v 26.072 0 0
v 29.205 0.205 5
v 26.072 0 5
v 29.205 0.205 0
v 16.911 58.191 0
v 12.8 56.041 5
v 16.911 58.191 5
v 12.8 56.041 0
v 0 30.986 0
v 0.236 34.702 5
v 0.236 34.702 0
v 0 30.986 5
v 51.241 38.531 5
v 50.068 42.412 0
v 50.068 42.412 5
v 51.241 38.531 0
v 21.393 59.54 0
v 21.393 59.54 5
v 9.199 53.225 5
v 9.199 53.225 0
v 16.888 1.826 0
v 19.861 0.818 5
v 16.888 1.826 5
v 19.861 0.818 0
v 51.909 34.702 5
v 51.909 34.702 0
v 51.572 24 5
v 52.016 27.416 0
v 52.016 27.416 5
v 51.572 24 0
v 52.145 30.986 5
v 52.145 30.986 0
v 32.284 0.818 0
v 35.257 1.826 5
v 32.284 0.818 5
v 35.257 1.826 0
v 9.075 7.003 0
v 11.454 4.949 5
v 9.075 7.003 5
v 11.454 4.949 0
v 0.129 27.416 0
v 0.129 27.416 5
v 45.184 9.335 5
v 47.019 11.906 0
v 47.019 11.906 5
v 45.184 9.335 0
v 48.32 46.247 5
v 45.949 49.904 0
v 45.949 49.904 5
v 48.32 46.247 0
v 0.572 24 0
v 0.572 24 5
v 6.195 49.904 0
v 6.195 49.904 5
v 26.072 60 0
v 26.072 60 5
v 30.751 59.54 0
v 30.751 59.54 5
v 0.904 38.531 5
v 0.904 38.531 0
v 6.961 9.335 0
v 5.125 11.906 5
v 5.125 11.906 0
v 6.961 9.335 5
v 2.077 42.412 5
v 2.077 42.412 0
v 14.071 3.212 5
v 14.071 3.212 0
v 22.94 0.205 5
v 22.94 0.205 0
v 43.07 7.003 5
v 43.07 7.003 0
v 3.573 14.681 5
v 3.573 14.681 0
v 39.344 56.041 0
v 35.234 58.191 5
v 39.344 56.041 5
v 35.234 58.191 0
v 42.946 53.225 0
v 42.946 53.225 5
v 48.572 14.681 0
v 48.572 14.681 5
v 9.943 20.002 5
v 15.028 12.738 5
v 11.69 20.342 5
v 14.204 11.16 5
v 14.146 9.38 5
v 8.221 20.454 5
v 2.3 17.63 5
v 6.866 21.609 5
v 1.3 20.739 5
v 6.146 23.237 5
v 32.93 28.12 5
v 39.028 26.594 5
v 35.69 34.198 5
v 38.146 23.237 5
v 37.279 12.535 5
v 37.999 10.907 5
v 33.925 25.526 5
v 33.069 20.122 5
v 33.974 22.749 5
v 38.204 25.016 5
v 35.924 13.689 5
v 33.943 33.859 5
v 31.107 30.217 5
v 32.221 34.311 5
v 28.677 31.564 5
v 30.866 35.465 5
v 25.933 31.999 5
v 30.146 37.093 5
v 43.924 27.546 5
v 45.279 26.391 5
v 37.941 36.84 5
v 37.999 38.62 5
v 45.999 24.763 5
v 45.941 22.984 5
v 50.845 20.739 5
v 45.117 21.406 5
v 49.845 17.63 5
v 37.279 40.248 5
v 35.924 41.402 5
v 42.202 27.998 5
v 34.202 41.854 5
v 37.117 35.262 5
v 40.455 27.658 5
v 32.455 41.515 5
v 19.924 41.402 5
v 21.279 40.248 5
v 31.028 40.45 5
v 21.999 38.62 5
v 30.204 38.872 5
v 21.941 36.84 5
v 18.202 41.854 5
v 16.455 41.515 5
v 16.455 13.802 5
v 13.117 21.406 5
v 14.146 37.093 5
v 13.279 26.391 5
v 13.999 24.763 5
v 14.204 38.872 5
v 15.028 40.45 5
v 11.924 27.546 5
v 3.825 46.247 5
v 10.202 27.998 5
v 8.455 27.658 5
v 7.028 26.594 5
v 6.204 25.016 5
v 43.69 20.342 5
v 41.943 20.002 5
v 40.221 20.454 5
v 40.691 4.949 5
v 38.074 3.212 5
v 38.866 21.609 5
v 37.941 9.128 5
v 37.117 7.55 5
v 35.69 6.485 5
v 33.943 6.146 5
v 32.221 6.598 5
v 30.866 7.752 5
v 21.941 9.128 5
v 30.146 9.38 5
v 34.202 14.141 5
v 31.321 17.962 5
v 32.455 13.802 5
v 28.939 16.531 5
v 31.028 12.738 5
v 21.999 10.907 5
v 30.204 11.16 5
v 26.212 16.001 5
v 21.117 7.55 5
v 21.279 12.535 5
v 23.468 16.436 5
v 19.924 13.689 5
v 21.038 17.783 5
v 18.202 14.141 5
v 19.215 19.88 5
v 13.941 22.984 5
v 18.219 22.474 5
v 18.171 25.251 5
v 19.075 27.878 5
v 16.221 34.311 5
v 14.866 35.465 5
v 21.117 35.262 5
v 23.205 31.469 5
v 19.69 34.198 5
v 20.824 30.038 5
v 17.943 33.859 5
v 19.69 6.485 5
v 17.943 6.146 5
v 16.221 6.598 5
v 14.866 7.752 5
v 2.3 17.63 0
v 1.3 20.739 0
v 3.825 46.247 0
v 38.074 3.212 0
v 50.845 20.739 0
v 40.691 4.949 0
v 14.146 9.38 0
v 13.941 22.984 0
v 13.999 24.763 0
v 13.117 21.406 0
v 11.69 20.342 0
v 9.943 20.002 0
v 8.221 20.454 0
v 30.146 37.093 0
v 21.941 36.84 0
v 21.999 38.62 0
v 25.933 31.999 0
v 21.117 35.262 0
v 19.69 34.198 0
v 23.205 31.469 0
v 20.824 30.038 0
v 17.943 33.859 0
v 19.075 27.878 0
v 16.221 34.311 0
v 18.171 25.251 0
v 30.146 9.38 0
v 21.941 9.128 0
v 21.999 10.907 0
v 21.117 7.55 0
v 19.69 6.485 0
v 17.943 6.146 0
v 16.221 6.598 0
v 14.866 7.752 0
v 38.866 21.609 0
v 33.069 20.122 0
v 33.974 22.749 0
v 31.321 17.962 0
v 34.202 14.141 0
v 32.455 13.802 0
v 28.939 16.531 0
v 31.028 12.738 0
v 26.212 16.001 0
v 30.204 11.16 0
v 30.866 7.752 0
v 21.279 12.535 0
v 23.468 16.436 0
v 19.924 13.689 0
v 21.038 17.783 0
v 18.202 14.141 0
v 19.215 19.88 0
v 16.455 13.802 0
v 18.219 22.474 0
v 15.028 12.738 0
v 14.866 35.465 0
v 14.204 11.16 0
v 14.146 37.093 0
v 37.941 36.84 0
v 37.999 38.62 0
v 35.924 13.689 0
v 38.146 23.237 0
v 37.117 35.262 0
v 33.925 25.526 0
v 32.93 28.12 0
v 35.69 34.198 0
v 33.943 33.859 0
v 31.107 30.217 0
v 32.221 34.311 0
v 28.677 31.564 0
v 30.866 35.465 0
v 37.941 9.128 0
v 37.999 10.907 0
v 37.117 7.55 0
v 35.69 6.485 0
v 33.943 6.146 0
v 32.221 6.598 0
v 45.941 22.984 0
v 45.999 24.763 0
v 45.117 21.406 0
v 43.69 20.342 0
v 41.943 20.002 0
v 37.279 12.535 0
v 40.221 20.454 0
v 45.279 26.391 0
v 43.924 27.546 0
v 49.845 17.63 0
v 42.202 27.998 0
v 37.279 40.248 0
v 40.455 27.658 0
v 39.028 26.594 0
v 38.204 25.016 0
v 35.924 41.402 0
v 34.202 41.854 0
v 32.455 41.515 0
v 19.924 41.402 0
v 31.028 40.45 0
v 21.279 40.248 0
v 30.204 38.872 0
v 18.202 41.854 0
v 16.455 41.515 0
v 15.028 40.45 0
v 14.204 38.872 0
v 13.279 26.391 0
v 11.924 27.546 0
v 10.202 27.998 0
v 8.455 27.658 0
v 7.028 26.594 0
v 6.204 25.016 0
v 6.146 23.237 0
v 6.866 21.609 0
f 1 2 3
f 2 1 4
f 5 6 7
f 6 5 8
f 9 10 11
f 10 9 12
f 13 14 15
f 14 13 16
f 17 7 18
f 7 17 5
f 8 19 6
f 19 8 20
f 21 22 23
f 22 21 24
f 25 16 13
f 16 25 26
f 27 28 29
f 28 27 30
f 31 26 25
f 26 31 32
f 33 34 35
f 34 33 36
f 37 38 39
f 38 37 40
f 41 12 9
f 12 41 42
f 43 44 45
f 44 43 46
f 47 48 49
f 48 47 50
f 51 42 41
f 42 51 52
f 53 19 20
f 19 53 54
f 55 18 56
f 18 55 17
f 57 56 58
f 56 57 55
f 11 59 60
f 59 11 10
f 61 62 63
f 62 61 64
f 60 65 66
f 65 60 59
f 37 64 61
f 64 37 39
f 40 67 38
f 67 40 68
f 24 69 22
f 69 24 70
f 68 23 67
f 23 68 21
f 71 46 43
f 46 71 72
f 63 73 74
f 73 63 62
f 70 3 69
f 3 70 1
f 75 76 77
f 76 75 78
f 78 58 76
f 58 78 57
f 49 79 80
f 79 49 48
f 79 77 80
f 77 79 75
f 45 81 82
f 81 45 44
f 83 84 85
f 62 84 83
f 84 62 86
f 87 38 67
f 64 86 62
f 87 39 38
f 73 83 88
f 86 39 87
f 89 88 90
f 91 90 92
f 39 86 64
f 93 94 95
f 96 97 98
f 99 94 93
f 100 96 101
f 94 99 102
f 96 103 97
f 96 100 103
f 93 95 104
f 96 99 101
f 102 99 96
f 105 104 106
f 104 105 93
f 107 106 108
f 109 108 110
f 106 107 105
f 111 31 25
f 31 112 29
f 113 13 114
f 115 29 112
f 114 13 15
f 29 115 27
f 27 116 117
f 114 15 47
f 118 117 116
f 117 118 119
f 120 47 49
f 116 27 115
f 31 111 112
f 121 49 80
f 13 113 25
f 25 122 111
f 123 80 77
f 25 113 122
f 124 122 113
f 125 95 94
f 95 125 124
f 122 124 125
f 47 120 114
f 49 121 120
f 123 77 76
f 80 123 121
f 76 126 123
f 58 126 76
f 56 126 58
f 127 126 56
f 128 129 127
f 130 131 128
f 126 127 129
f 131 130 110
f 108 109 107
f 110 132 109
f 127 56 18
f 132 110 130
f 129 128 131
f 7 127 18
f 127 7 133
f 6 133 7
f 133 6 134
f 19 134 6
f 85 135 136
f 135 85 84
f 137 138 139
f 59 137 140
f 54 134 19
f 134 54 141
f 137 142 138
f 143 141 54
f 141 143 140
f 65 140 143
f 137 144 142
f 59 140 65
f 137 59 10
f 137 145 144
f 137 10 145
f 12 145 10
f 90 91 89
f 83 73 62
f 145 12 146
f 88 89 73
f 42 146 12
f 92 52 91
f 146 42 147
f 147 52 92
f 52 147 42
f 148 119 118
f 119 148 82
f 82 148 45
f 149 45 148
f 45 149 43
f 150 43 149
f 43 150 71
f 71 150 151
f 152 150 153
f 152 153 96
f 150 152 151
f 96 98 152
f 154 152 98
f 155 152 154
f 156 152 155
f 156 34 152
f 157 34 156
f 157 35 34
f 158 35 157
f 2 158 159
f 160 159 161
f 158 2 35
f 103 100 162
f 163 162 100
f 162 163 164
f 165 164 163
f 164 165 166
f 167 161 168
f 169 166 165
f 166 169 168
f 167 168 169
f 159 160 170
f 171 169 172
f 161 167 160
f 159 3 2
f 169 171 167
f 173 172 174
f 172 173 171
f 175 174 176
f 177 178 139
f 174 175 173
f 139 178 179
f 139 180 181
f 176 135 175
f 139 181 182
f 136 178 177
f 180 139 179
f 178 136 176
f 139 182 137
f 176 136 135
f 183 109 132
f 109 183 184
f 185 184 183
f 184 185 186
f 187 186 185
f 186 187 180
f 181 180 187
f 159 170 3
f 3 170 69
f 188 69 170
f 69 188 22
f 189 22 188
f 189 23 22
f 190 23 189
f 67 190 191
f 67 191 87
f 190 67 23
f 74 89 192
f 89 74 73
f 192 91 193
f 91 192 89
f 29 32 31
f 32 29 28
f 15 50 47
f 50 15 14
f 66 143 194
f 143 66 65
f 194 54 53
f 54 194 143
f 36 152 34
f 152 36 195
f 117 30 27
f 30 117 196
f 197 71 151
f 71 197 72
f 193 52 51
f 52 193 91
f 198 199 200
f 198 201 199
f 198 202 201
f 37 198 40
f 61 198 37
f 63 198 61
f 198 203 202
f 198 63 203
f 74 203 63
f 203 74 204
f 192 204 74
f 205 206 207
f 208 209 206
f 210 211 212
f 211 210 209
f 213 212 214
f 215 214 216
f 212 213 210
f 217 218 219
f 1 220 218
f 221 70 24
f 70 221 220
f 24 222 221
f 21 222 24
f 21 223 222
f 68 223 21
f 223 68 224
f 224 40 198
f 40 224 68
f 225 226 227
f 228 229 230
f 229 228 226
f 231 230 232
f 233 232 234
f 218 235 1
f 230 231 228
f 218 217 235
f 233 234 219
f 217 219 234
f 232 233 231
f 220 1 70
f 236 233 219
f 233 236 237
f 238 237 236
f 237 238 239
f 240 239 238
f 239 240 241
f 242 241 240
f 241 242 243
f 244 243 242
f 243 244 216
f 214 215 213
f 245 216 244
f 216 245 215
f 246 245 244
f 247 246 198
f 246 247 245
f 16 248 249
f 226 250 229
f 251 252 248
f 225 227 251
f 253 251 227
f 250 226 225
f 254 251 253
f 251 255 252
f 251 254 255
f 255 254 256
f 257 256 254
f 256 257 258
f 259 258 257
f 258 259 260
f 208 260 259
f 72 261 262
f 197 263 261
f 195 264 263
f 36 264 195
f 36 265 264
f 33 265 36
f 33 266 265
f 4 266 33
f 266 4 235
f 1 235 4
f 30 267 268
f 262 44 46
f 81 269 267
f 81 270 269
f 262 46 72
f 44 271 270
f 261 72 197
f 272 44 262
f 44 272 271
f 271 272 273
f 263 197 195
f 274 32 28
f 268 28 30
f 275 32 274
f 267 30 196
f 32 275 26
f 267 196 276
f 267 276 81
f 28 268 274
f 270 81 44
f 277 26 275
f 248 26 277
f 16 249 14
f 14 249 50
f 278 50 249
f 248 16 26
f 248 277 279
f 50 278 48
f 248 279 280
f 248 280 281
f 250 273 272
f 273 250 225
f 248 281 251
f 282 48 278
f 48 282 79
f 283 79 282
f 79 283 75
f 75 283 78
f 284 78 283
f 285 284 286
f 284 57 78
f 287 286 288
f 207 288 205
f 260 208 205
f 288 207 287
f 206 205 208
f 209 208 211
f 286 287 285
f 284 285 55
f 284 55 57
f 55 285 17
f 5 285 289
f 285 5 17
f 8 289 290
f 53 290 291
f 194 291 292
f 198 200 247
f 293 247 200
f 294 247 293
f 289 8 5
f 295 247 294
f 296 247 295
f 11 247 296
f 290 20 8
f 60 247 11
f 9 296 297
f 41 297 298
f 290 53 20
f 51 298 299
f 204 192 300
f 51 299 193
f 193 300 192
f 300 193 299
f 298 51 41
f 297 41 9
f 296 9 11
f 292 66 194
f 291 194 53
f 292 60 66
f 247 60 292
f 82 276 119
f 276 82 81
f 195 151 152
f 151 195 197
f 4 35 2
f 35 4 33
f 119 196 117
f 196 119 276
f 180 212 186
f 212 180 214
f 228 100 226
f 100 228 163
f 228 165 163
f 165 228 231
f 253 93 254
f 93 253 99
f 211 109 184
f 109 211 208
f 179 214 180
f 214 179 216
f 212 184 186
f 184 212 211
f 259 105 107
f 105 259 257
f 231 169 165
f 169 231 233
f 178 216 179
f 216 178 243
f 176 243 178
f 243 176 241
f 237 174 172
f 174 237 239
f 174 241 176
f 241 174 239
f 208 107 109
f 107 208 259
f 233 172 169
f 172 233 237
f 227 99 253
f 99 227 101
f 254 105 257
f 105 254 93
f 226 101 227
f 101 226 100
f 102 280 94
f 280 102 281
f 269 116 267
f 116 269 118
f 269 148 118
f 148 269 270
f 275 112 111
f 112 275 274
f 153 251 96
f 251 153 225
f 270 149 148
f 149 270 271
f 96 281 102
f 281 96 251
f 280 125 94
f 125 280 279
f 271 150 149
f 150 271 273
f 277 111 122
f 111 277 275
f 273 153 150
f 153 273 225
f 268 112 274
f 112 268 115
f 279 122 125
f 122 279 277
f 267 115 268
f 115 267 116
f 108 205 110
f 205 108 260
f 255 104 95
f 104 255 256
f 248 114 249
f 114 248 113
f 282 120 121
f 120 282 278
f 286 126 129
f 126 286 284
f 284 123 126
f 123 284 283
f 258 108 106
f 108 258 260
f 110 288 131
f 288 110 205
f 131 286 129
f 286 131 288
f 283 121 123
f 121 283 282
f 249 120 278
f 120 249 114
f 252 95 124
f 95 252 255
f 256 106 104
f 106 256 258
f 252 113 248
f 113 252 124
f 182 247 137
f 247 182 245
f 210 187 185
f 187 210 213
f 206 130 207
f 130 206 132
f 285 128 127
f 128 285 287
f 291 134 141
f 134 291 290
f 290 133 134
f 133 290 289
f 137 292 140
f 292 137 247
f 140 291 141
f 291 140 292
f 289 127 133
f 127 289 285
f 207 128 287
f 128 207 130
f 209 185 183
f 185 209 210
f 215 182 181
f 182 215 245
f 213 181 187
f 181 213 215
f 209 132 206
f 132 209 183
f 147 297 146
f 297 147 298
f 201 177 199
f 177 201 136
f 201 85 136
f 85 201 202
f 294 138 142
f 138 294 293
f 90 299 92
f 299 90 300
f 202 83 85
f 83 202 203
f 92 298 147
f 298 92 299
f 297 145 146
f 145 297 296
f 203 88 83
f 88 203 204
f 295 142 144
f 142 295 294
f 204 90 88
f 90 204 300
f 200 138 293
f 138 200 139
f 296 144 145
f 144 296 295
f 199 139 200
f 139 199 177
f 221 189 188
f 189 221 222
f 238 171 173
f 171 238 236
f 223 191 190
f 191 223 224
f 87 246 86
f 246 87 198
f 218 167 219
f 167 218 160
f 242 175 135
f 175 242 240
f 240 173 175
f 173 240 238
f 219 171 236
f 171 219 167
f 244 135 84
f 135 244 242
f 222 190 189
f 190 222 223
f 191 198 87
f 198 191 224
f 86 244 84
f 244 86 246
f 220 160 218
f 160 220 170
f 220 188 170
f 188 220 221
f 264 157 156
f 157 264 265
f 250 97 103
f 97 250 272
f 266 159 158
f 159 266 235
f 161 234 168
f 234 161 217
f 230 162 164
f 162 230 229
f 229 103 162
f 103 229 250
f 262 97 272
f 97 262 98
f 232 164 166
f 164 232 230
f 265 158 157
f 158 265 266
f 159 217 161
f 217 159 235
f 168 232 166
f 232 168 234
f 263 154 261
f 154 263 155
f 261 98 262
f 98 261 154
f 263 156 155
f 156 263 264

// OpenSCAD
$fn = 32;

// ----------------------------------------------------------------------
// Cam plate: single_lobe cam, base R24
// ----------------------------------------------------------------------

// --- parameters (mm) ---
base_r = 24;              // base circle radius
lobe_h = 12;              // cam lobe rise
bore_r = 8;               // shaft bore radius
plate_t = 5;              // plate thickness, Z (extrusion height)
ring_r = 16;              // lightening ring radius
bolt_r = 4;               // lightening hole radius

profile = [[51.572, 24], [52.016, 27.416], [52.145, 30.986], [51.909, 34.702], [51.241, 38.531], [50.068, 42.412], [48.32, 46.247], [45.949, 49.904], [42.946, 53.225], [39.344, 56.041], [35.234, 58.191], [30.751, 59.54], [26.072, 60], [21.393, 59.54], [16.911, 58.191], [12.8, 56.041], [9.199, 53.225], [6.195, 49.904], [3.825, 46.247], [2.077, 42.412], [0.904, 38.531], [0.236, 34.702], [0, 30.986], [0.129, 27.416], [0.572, 24], [1.3, 20.739], [2.3, 17.63], [3.573, 14.681], [5.125, 11.906], [6.961, 9.335], [9.075, 7.003], [11.454, 4.949], [14.071, 3.212], [16.888, 1.826], [19.861, 0.818], [22.94, 0.205], [26.072, 0], [29.205, 0.205], [32.284, 0.818], [35.257, 1.826], [38.074, 3.212], [40.691, 4.949], [43.07, 7.003], [45.184, 9.335], [47.019, 11.906], [48.572, 14.681], [49.845, 17.63], [50.845, 20.739]];  // primary outline, 48 points, counter clockwise
void_1 = [[33.925, 25.526], [32.93, 28.12], [31.107, 30.217], [28.677, 31.564], [25.933, 31.999], [23.205, 31.469], [20.824, 30.038], [19.075, 27.878], [18.171, 25.251], [18.219, 22.474], [19.215, 19.88], [21.038, 17.783], [23.468, 16.436], [26.212, 16.001], [28.939, 16.531], [31.321, 17.962], [33.069, 20.122], [33.974, 22.749]];  // shaft bore, 18 points
void_2 = [[45.999, 24.763], [45.279, 26.391], [43.924, 27.546], [42.202, 27.998], [40.455, 27.658], [39.028, 26.594], [38.204, 25.016], [38.146, 23.237], [38.866, 21.609], [40.221, 20.454], [41.943, 20.002], [43.69, 20.342], [45.117, 21.406], [45.941, 22.984]];  // lightening hole 1, 14 points
void_3 = [[37.999, 38.62], [37.279, 40.248], [35.924, 41.402], [34.202, 41.854], [32.455, 41.515], [31.028, 40.45], [30.204, 38.872], [30.146, 37.093], [30.866, 35.465], [32.221, 34.311], [33.943, 33.859], [35.69, 34.198], [37.117, 35.262], [37.941, 36.84]];  // lightening hole 2, 14 points
void_4 = [[21.999, 38.62], [21.279, 40.248], [19.924, 41.402], [18.202, 41.854], [16.455, 41.515], [15.028, 40.45], [14.204, 38.872], [14.146, 37.093], [14.866, 35.465], [16.221, 34.311], [17.943, 33.859], [19.69, 34.198], [21.117, 35.262], [21.941, 36.84]];  // lightening hole 3, 14 points
void_5 = [[13.999, 24.763], [13.279, 26.391], [11.924, 27.546], [10.202, 27.998], [8.455, 27.658], [7.028, 26.594], [6.204, 25.016], [6.146, 23.237], [6.866, 21.609], [8.221, 20.454], [9.943, 20.002], [11.69, 20.342], [13.117, 21.406], [13.941, 22.984]];  // lightening hole 4, 14 points
void_6 = [[21.999, 10.907], [21.279, 12.535], [19.924, 13.689], [18.202, 14.141], [16.455, 13.802], [15.028, 12.738], [14.204, 11.16], [14.146, 9.38], [14.866, 7.752], [16.221, 6.598], [17.943, 6.146], [19.69, 6.485], [21.117, 7.55], [21.941, 9.128]];  // lightening hole 5, 14 points
void_7 = [[37.999, 10.907], [37.279, 12.535], [35.924, 13.689], [34.202, 14.141], [32.455, 13.802], [31.028, 12.738], [30.204, 11.16], [30.146, 9.38], [30.866, 7.752], [32.221, 6.598], [33.943, 6.146], [35.69, 6.485], [37.117, 7.55], [37.941, 9.128]];  // lightening hole 6, 14 points

// --- the one profile operation ---
difference() {
  linear_extrude(height = plate_t) polygon(points = profile);
  translate([0, 0, -1])
    linear_extrude(height = plate_t + 2) polygon(points = void_1);
  translate([0, 0, -1])
    linear_extrude(height = plate_t + 2) polygon(points = void_2);
  translate([0, 0, -1])
    linear_extrude(height = plate_t + 2) polygon(points = void_3);
  translate([0, 0, -1])
    linear_extrude(height = plate_t + 2) polygon(points = void_4);
  translate([0, 0, -1])
    linear_extrude(height = plate_t + 2) polygon(points = void_5);
  translate([0, 0, -1])
    linear_extrude(height = plate_t + 2) polygon(points = void_6);
  translate([0, 0, -1])
    linear_extrude(height = plate_t + 2) polygon(points = void_7);
}
